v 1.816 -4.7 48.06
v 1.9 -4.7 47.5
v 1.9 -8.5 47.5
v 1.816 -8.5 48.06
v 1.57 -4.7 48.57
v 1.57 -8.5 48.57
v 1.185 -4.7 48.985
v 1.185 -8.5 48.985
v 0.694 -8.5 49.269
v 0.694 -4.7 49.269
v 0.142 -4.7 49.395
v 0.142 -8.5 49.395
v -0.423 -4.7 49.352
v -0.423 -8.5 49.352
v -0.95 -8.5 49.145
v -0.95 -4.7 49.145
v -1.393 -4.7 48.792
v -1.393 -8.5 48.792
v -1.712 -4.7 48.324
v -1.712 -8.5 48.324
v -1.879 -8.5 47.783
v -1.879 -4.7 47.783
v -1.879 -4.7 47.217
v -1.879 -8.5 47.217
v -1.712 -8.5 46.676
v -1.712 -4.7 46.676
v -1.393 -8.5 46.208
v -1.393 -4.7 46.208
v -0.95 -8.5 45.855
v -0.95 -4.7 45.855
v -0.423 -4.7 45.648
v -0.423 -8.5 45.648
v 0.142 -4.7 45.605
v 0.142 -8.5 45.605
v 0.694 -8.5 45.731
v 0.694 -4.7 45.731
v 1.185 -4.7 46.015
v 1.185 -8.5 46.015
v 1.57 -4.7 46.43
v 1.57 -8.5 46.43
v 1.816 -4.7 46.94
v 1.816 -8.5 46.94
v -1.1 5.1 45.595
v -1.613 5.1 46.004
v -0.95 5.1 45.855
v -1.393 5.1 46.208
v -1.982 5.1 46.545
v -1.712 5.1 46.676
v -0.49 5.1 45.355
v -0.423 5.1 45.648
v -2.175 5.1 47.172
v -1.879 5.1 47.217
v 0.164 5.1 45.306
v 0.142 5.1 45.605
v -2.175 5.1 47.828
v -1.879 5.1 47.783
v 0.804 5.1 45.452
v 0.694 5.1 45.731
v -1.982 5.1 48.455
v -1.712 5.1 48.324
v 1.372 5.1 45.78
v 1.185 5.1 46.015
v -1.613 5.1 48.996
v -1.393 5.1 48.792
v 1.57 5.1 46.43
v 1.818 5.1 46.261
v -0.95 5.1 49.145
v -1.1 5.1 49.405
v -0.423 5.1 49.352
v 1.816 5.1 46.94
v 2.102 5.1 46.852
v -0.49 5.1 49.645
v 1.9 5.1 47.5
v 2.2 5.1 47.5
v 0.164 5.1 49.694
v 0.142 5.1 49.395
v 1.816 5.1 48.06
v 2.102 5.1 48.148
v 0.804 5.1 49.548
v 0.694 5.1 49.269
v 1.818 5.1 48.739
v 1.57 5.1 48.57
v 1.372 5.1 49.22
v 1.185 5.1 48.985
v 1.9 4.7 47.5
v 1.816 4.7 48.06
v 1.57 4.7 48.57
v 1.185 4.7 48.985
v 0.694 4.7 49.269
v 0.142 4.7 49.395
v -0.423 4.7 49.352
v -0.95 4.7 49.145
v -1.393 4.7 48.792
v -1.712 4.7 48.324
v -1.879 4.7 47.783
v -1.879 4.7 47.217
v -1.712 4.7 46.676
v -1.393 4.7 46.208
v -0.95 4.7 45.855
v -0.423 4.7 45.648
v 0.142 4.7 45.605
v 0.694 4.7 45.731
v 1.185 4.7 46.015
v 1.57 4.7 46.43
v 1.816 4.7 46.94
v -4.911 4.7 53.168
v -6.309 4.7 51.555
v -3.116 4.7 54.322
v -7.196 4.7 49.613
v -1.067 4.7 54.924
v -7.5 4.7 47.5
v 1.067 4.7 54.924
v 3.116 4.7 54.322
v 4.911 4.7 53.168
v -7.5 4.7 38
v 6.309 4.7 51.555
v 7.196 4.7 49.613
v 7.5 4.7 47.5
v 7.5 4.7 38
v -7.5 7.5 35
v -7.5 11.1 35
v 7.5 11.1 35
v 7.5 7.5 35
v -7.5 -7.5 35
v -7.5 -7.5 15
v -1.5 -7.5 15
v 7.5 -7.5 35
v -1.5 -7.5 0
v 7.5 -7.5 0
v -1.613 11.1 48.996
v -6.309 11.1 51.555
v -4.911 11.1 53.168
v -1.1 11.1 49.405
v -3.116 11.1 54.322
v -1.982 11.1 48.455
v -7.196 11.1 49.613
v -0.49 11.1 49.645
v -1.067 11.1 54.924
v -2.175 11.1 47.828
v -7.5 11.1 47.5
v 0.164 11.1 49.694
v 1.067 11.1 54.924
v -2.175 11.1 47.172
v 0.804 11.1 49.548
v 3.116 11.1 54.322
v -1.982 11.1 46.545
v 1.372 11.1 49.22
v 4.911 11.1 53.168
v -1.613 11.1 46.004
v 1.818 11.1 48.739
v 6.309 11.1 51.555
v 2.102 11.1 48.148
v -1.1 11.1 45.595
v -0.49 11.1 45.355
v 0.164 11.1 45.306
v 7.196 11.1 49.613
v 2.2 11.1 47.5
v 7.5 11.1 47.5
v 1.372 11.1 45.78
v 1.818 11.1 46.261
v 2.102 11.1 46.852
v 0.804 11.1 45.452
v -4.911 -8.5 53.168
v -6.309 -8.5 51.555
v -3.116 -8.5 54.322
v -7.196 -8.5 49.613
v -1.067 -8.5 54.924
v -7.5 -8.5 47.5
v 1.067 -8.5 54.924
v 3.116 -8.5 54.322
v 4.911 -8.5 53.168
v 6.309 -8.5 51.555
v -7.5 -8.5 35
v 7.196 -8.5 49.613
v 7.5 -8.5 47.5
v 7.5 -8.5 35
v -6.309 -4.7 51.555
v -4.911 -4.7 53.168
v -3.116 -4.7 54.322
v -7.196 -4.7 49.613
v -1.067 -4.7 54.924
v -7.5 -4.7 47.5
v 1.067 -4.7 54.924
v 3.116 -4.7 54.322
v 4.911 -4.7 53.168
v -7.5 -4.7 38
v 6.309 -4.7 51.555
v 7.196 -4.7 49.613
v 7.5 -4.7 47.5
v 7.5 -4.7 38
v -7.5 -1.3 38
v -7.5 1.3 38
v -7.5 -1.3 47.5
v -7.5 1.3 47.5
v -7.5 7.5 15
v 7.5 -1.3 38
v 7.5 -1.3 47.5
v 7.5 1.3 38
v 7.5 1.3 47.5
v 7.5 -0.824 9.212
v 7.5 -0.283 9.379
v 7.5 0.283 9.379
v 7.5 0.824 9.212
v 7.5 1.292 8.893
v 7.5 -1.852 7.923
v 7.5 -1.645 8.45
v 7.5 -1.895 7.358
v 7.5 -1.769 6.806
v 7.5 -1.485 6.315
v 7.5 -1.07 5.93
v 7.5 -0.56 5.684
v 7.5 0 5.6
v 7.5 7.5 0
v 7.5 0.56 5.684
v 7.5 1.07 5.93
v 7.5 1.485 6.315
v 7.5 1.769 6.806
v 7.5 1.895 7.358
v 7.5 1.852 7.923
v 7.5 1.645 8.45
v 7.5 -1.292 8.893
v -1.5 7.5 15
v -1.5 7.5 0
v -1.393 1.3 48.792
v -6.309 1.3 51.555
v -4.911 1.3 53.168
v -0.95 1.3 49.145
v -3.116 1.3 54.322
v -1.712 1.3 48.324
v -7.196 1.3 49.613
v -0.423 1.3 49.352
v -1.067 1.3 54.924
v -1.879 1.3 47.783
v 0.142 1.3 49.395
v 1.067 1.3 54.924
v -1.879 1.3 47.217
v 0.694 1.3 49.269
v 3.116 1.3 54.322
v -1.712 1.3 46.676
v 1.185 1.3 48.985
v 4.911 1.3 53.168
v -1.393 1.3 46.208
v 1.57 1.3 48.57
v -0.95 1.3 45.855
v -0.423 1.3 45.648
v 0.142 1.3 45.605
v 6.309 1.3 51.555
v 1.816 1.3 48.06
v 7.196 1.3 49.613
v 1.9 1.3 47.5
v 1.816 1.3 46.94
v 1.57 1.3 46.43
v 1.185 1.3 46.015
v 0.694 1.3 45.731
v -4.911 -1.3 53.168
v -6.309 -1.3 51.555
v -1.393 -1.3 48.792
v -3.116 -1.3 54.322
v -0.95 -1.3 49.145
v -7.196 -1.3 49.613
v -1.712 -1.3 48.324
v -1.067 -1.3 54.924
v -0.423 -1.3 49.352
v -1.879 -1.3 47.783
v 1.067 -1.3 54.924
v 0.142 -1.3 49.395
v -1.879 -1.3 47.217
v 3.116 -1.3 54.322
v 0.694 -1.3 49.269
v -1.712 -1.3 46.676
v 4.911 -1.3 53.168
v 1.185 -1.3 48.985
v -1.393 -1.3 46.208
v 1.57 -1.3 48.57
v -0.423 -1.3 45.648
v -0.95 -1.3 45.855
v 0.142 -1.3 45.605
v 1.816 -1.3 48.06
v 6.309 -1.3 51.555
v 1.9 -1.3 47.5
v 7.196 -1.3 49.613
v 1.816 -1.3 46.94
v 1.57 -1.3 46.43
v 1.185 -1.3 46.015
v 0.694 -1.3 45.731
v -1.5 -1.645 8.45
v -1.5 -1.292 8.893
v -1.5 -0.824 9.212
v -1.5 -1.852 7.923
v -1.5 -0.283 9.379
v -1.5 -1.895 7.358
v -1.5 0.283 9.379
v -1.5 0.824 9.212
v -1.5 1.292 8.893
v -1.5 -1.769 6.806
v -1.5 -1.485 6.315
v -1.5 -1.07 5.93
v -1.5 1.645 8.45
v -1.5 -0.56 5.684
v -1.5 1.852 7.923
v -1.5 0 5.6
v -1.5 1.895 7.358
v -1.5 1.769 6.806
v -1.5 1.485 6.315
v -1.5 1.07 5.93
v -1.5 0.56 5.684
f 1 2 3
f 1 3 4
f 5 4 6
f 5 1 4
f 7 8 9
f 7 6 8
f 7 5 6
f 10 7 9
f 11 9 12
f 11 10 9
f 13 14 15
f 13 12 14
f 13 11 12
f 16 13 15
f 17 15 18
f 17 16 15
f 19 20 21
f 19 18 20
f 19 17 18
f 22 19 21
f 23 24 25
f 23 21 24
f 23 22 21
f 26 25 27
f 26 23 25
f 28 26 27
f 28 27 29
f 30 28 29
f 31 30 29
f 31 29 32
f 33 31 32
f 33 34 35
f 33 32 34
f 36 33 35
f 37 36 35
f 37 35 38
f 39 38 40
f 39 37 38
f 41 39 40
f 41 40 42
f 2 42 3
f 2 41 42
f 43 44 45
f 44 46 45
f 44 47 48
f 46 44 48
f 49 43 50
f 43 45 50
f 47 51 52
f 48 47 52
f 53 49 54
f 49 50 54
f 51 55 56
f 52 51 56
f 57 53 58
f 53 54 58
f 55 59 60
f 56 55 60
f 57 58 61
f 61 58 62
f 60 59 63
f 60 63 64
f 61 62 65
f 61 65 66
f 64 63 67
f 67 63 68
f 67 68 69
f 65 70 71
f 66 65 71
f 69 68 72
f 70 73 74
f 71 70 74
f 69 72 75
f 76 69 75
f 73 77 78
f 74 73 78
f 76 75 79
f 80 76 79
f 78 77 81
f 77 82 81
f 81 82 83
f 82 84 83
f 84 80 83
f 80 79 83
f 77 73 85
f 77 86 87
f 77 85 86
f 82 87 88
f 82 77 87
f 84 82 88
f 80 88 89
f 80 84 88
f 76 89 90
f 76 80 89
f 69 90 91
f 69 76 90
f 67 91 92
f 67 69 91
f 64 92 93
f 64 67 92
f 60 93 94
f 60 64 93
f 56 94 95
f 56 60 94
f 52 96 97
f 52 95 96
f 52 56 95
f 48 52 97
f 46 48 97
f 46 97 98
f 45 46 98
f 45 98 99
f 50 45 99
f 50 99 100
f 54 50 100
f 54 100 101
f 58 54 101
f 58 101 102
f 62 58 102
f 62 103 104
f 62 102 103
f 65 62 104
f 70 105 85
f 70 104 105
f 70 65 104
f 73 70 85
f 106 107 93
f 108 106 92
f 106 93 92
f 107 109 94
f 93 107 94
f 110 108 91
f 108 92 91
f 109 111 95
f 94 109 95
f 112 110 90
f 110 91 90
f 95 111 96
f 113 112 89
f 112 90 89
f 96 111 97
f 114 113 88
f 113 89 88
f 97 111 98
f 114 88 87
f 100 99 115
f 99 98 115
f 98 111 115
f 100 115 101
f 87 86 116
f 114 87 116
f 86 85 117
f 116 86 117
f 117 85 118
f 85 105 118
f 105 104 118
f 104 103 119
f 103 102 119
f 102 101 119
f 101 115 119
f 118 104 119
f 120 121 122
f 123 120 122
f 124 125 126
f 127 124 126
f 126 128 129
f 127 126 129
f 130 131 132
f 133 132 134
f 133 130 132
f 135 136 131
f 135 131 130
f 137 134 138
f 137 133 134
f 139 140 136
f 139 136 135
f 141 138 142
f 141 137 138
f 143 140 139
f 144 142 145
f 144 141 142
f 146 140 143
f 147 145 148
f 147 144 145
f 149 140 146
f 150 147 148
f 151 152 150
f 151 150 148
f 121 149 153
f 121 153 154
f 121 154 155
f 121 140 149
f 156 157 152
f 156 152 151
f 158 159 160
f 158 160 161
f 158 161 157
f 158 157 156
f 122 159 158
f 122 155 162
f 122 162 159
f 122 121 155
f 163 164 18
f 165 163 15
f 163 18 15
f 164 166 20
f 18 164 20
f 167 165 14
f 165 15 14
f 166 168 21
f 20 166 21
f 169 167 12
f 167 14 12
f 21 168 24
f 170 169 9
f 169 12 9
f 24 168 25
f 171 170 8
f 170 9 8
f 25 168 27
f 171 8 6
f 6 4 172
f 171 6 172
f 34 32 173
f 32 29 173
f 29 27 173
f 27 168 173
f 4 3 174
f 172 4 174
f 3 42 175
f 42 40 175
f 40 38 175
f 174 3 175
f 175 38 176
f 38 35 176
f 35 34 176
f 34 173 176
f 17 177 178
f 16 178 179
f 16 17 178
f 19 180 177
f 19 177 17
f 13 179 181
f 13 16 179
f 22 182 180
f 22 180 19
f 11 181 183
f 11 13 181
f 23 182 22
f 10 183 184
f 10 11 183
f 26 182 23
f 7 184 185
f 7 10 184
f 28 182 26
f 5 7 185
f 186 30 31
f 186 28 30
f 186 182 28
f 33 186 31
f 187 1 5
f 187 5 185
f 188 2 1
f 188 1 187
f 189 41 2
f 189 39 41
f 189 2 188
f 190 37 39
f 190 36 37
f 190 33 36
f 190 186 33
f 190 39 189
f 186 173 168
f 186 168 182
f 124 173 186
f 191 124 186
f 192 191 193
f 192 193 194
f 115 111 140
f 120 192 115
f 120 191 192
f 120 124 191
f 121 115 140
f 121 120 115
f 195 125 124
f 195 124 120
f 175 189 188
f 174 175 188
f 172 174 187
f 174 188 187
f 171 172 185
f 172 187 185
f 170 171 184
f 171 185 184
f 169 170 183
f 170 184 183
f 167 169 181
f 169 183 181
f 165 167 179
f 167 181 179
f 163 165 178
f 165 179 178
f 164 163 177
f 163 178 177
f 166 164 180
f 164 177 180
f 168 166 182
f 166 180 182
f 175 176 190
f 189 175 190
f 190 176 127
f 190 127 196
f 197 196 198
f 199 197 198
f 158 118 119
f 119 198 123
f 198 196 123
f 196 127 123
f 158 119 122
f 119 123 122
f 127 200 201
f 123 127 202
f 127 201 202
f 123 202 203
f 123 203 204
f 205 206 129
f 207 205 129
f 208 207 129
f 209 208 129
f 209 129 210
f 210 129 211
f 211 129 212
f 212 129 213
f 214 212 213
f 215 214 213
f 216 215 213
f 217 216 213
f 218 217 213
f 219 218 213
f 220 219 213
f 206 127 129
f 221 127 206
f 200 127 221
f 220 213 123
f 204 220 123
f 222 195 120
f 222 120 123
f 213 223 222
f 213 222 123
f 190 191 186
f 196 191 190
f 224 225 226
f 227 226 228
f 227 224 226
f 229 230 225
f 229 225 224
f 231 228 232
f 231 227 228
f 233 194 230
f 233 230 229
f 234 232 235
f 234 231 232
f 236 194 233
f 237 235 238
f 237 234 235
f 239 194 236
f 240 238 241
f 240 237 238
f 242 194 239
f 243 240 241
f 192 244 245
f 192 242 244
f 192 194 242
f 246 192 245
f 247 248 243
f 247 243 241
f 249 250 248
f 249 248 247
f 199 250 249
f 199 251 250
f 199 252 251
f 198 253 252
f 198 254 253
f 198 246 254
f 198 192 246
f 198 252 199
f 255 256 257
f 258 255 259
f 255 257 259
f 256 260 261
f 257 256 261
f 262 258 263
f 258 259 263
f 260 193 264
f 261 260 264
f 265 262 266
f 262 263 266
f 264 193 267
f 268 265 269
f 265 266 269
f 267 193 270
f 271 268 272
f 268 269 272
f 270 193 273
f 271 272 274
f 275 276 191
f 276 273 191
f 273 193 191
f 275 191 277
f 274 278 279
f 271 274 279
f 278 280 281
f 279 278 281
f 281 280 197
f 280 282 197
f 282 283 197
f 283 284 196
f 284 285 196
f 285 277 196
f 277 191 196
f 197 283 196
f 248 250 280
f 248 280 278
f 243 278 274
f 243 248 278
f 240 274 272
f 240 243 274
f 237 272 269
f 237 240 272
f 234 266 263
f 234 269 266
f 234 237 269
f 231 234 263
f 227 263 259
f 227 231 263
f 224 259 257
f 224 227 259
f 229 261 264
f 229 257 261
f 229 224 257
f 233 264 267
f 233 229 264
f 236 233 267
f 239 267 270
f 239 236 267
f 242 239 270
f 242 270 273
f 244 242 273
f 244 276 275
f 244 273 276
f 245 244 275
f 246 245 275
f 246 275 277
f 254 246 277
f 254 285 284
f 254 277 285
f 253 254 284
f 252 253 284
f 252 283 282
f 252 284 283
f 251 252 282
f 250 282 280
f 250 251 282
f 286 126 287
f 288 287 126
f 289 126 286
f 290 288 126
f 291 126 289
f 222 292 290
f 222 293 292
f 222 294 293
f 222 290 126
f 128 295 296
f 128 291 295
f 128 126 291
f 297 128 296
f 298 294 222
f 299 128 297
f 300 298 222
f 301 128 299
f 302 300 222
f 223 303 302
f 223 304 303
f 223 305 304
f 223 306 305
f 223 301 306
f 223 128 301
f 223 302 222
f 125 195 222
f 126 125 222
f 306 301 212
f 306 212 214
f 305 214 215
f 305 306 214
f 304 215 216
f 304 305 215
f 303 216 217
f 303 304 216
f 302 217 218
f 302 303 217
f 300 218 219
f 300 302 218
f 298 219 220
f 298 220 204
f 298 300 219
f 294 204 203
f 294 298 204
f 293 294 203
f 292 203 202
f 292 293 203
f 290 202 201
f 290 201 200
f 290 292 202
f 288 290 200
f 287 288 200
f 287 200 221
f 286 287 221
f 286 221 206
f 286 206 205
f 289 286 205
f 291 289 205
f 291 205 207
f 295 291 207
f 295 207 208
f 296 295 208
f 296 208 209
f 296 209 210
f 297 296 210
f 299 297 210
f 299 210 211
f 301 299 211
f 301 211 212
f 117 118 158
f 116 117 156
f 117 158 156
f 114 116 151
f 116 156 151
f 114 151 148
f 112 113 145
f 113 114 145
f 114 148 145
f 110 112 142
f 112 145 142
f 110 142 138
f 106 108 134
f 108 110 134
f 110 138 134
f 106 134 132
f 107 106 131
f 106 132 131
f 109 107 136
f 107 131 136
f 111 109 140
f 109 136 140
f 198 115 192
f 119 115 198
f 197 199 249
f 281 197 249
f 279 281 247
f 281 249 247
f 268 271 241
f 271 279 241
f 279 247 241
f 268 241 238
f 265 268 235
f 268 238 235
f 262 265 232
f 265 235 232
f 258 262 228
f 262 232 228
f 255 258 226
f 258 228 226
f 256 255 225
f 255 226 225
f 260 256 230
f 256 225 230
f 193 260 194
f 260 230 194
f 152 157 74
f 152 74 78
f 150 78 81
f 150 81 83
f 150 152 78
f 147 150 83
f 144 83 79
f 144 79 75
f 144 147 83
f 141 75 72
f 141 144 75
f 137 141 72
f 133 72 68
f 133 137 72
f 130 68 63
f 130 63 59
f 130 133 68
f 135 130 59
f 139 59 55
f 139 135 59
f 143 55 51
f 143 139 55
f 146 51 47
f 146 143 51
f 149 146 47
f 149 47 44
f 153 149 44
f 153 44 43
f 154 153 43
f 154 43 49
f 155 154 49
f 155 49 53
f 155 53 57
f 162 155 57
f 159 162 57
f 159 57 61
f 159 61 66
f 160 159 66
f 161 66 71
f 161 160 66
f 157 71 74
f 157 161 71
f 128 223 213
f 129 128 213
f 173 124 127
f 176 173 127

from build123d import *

# Parameters (mm, degrees)
BOX003_W                  = 15
BOX003_H                  = 3.4
BOX003_DEPTH              = 17
ARRAY_Y_COUNT             = 2
ARRAY_Y_PITCH             = 6
CYLINDER002_R             = 2.2
CYLINDER002_DEPTH         = 6
CYLINDER001_R             = 1.9
CYLINDER001_DEPTH         = 15
FUSION001_PLACEMENT_ANGLE = 90
CYLINDER_R                = 7.5
CYLINDER_DEPTH            = 19.6
BOX002_W                  = 15
BOX002_H                  = 19.6
BOX002_DEPTH              = 12.5
CYLINDER006_R             = 1.9
CYLINDER006_DEPTH         = 15
BOX007_W                  = 9
BOX007_H                  = 15
BOX007_DEPTH              = 15
BOX006_W                  = 15
BOX006_H                  = 15
BOX006_DEPTH              = 20


with BuildPart() as side_3_extract_cube_array:
    # Box003 → Box003 (new body)
    with BuildSketch(Plane(origin=(-7.5, -7.7, 3), x_dir=(1, 0, 0), z_dir=(0, 0, 1))):
        with Locations((7.5, 1.7)):
            Rectangle(BOX003_W, BOX003_H)
    extrude(amount=BOX003_DEPTH)

    # Array Y: side 3 extract cube array ×2


with BuildPart() as side_3_extract_cube_array_1:
    add(side_3_extract_cube_array.part)
    with Locations(*[(0, i * ARRAY_Y_PITCH, 0) for i in range(1, ARRAY_Y_COUNT)]):
        add(side_3_extract_cube_array.part)


with BuildPart() as side_3_extract_cube_array_2:
    # Array placement: moved
    add(side_3_extract_cube_array_1.part.moved(Location((0, 3, 0))))


with BuildPart() as insert_hole:
    # Cylinder002 → Cylinder002 (new body)
    with BuildSketch(Plane.XY):
        Circle(CYLINDER002_R)
    extrude(amount=CYLINDER002_DEPTH)


with BuildPart() as side_3_extract_fusion:
    # Cylinder001 → Cylinder001 (new body)
    with BuildSketch(Plane.XY.offset(6)):
        Circle(CYLINDER001_R)
    extrude(amount=CYLINDER001_DEPTH)

    # Fusion001: union insert hole
    add(insert_hole.part)


with BuildPart() as side_3_extract_fusion_1:
    # Fusion001 placement: moved
    add(side_3_extract_fusion.part.moved(Location((0, 11.1, 12.5))).rotate(Axis((0, 11.1, 12.5), (1, 0, 0)), FUSION001_PLACEMENT_ANGLE))

    # Fusion002: union side 3 extract cube array
    add(side_3_extract_cube_array_2.part)


with BuildPart() as outer_cylinder:
    # Cylinder → Cylinder (new body)
    with BuildSketch(Plane(origin=(0, 11.1, 12.5), x_dir=(1, 0, 0), z_dir=(0, -1, 0))):
        Circle(CYLINDER_R)
    extrude(amount=CYLINDER_DEPTH)


with BuildPart() as side_3_cut_clone001:
    # Box002 → Box002 (new body)
    with BuildSketch(Plane(origin=(-7.5, -8.5, 0), x_dir=(1, 0, 0), z_dir=(0, 0, 1))):
        with Locations((7.5, 9.8)):
            Rectangle(BOX002_W, BOX002_H)
    extrude(amount=BOX002_DEPTH)

    # Fusion: union outer cylinder
    add(outer_cylinder.part)

    # Cut: cut side 3 extract fusion
    add(side_3_extract_fusion_1.part, mode=Mode.SUBTRACT)


with BuildPart() as side_3_cut_clone001_1:
    # Body002 placement: moved
    add(side_3_cut_clone001.part.moved(Location((0, 0, 35))))


with BuildPart() as bolt_hole001:
    # Cylinder006 → Cylinder006 (new body)
    with BuildSketch(Plane(origin=(-7.5, 0, 7.5), x_dir=(0, 0, -1), z_dir=(1, 0, 0))):
        Circle(CYLINDER006_R)
    extrude(amount=CYLINDER006_DEPTH)


with BuildPart() as one_cube_with_bolt_hole:
    # Box007 → Box007 (new body)
    with BuildSketch(Plane(origin=(-1.5, -7.5, 0), x_dir=(1, 0, 0), z_dir=(0, 0, 1))):
        with Locations((4.5, 7.5)):
            Rectangle(BOX007_W, BOX007_H)
    extrude(amount=BOX007_DEPTH)

    # Cut002: cut bolt hole001
    add(bolt_hole001.part, mode=Mode.SUBTRACT)


with BuildPart() as side_3_one_fusion:
    # Box006 → Box006 (new body)
    with BuildSketch(Plane(origin=(-7.5, -7.5, 15), x_dir=(1, 0, 0), z_dir=(0, 0, 1))):
        with Locations((7.5, 7.5)):
            Rectangle(BOX006_W, BOX006_H)
    extrude(amount=BOX006_DEPTH)

    # Fusion005: union side 3 cut clone001, one cube with bolt hole
    add(side_3_cut_clone001_1.part)
    add(one_cube_with_bolt_hole.part)


solid = side_3_one_fusion.part
